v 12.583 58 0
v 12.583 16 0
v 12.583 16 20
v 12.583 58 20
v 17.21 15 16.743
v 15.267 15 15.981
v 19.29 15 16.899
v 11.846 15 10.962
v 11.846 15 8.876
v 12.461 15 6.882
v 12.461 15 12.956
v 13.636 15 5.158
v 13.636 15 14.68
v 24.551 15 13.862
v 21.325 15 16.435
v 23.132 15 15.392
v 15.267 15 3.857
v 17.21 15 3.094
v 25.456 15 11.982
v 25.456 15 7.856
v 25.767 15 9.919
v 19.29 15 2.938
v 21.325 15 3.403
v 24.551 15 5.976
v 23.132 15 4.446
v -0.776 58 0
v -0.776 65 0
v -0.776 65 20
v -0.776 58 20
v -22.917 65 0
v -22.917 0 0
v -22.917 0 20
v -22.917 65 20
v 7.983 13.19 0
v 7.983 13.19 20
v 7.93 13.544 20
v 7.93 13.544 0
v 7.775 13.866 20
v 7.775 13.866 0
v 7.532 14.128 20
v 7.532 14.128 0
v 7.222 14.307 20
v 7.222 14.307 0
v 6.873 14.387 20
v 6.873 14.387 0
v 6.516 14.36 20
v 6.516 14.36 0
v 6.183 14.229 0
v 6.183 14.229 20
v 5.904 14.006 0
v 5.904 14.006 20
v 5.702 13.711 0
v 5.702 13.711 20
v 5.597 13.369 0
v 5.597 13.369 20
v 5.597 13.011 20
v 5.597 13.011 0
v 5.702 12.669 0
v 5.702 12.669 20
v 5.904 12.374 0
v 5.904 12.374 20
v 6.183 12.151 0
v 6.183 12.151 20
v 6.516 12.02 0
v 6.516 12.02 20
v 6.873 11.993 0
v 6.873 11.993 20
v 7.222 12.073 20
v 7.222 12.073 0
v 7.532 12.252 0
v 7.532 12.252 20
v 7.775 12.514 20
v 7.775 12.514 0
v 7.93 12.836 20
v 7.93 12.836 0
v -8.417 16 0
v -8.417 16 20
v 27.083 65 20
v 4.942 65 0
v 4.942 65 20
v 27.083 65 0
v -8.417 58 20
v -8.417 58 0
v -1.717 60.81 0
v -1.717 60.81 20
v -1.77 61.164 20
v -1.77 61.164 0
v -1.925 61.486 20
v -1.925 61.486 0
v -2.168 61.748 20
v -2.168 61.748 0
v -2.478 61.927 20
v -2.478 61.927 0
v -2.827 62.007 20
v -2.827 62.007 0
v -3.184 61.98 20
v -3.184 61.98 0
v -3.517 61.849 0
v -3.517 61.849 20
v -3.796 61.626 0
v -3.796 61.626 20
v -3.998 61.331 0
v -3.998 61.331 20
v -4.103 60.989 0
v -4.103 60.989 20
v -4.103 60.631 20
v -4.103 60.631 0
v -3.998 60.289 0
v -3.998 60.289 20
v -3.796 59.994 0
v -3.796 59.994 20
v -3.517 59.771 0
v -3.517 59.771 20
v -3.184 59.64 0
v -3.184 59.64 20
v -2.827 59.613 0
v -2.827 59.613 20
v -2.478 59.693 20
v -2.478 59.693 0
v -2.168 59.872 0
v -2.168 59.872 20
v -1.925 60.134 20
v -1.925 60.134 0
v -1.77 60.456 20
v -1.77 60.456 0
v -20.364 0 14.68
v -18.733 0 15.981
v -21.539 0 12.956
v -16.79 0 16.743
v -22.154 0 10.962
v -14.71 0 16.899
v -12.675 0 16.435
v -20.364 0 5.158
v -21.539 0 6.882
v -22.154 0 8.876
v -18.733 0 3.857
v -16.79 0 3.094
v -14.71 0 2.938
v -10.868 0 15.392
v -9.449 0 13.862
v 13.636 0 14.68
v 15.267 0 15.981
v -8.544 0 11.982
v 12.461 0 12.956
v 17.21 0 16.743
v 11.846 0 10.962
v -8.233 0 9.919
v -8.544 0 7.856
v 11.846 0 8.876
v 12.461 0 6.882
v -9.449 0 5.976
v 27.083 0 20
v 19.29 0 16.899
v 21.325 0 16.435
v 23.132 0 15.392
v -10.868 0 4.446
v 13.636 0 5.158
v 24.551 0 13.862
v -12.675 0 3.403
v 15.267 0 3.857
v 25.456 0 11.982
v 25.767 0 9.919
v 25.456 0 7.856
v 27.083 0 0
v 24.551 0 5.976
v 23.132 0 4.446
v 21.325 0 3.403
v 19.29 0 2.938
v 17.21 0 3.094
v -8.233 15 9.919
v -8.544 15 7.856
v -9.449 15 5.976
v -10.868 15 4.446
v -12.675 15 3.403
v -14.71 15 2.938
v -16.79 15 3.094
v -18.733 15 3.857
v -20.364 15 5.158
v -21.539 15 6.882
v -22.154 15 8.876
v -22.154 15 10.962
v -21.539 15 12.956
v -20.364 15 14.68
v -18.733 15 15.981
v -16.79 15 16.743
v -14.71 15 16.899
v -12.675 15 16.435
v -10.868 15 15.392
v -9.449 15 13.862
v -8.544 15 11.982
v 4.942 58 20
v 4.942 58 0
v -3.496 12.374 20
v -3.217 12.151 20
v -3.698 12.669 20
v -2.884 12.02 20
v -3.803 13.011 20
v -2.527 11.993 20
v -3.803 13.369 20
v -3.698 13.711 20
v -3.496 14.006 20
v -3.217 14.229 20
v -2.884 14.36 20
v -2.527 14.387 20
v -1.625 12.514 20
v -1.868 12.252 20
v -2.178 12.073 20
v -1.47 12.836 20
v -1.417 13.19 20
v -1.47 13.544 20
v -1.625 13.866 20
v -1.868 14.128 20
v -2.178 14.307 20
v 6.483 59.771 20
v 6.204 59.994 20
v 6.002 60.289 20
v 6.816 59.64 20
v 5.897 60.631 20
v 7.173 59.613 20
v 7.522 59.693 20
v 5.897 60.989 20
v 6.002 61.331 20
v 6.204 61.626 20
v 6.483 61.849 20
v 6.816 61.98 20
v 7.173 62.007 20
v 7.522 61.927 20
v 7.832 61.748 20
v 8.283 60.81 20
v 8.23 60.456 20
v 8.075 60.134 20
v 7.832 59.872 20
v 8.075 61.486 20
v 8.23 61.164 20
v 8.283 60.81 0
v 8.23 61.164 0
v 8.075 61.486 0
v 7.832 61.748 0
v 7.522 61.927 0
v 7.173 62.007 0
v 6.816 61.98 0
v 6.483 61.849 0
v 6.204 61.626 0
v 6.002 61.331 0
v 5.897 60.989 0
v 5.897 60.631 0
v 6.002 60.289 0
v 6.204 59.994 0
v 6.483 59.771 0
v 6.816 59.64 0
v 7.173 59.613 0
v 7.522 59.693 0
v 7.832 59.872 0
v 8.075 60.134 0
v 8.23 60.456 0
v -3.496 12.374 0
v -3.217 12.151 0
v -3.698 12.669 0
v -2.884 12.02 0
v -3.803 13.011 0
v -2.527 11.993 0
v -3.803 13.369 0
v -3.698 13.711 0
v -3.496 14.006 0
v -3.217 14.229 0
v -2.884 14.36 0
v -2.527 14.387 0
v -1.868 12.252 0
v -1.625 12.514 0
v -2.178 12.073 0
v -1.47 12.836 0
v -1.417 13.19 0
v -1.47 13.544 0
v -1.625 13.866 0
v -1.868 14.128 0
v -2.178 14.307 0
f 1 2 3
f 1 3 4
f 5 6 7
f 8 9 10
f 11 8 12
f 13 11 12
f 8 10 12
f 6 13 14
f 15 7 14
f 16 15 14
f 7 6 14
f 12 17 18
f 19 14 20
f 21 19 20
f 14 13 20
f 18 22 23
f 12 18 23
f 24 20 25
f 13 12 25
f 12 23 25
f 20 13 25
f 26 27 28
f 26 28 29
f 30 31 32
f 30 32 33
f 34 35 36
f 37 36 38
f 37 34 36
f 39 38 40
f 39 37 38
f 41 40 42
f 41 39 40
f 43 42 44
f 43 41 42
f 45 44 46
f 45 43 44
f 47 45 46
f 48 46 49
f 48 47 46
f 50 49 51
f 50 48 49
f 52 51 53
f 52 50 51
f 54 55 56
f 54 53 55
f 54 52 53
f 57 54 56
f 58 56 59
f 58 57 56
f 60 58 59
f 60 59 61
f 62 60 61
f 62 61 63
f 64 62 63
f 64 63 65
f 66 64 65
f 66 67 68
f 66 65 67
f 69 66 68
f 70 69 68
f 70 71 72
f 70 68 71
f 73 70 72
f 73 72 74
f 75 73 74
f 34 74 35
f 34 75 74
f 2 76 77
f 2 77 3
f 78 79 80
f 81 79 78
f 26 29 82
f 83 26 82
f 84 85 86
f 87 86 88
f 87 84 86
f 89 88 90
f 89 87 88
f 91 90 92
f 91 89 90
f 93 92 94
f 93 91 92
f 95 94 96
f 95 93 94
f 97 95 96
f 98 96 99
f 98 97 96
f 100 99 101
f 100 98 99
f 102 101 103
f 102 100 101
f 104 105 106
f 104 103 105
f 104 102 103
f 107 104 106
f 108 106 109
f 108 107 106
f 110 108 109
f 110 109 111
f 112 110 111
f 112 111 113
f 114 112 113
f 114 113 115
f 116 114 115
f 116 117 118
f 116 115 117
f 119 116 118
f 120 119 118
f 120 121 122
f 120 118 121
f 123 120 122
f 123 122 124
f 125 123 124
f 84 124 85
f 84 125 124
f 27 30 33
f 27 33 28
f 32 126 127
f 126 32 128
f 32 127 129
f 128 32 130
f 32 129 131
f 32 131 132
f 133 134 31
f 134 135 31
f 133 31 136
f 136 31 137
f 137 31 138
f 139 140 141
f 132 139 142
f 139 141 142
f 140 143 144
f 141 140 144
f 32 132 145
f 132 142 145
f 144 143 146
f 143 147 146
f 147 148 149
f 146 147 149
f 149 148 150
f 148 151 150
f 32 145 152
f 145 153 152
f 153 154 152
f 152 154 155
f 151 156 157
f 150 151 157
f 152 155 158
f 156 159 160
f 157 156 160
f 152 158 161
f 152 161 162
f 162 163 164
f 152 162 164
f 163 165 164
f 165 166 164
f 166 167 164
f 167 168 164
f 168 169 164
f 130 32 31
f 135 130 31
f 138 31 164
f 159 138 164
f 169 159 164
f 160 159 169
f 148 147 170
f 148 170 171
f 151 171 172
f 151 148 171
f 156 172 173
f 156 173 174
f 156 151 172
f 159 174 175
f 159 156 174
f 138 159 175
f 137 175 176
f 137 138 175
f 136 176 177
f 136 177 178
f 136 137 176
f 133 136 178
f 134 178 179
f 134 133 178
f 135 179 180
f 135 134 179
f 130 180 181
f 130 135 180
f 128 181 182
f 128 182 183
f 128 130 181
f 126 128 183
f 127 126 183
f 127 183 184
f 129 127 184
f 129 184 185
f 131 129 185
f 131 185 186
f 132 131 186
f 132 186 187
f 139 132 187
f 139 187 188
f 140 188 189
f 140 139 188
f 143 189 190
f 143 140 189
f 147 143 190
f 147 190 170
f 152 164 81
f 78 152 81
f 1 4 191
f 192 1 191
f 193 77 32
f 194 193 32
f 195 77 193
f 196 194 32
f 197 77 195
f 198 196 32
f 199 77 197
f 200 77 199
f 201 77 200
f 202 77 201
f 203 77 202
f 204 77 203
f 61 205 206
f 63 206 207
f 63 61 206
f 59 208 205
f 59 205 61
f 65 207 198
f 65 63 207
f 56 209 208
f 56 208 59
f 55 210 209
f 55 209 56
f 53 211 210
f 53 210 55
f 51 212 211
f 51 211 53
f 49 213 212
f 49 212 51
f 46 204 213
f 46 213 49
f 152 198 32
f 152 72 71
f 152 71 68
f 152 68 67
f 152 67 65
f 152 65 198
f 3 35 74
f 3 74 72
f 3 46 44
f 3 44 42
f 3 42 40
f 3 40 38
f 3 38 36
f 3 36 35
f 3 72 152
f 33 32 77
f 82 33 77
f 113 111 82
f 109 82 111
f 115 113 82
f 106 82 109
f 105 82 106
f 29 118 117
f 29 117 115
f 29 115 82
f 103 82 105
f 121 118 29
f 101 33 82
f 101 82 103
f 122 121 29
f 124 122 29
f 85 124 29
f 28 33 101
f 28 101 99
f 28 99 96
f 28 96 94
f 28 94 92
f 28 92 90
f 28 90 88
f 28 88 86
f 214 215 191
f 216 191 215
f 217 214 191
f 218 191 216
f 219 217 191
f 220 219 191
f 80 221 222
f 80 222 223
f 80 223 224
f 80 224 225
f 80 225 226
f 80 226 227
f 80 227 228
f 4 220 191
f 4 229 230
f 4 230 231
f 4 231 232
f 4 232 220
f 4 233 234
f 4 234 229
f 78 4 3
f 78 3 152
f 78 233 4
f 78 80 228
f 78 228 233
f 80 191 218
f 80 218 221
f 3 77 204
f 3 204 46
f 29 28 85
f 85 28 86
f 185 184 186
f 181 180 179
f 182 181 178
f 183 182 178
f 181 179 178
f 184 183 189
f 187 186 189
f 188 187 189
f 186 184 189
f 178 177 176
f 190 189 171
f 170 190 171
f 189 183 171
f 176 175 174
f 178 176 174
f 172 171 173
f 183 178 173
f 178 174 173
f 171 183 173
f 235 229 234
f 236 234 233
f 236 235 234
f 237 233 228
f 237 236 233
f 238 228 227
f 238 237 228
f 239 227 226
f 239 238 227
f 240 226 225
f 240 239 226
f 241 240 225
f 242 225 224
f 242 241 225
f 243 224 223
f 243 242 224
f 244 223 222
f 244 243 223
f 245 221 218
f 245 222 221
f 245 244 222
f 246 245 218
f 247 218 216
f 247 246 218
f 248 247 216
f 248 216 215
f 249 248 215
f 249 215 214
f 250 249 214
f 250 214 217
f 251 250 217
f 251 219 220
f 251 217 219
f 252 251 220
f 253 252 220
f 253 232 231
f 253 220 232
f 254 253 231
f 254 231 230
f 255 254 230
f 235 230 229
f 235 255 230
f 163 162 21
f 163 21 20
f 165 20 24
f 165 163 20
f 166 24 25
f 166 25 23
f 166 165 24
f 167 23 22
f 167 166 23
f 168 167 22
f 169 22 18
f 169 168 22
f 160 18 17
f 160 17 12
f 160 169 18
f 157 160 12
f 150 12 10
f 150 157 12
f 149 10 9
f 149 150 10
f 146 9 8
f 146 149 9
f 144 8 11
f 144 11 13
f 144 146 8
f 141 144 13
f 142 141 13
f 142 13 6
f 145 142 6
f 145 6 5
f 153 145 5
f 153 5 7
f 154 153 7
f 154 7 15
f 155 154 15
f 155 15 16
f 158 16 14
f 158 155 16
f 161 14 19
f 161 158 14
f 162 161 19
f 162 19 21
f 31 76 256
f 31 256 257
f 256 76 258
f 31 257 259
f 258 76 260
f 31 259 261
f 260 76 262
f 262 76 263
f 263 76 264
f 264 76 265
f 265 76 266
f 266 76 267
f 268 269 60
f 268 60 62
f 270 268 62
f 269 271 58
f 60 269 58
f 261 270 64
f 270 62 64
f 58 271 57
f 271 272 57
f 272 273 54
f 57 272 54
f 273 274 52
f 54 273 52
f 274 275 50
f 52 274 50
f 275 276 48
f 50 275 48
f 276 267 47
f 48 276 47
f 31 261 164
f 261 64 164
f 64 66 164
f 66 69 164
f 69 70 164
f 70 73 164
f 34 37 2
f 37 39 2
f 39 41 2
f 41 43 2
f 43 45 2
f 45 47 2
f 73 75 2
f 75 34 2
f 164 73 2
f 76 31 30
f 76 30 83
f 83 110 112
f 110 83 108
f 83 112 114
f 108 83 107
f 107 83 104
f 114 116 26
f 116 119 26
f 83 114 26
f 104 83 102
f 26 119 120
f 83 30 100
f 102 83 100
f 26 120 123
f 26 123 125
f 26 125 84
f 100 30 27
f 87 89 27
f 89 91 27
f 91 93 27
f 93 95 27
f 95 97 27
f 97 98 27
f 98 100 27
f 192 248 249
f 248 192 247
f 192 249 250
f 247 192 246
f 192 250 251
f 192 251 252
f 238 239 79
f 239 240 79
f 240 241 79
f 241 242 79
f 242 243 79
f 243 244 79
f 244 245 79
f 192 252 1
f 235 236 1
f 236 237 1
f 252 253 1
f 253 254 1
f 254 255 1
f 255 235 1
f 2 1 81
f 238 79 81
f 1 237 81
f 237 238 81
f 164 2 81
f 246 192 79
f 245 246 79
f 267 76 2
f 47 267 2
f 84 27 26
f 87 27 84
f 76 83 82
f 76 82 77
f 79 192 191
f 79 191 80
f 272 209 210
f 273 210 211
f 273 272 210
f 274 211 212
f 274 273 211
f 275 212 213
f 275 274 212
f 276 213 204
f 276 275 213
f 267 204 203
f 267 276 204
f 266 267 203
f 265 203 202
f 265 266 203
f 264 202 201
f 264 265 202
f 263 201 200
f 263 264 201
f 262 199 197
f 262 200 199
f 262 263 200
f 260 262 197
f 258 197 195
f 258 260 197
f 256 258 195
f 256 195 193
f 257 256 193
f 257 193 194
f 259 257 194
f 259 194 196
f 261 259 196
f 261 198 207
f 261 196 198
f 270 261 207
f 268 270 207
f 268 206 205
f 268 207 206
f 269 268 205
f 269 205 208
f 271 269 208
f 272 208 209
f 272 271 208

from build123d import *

# Parameters (mm, degrees)
SKETCH_1_W          = 50
SKETCH_1_H          = 65
BOSS_EXTRUDE1_DEPTH = 20
SKETCH11_R          = 1.2
CUT_EXTRUDE1_DEPTH  = 28
SKETCH12_R          = 7
CUT_EXTRUDE2_DEPTH  = 15


with BuildPart() as part:
    # 草圖1 → Boss-Extrude1 (new body)
    with BuildSketch(Plane.XY):
        with Locations((2.083333333, 32.5)):
            Rectangle(SKETCH_1_W, SKETCH_1_H)
    extrude(amount=BOSS_EXTRUDE1_DEPTH)

    # Sketch11 → Cut-Extrude1 (cut)
    with BuildSketch(Plane.XY):
        with Locations((-2.916666667, 60.81)):
            Circle(SKETCH11_R)
        with Locations((-2.616666667, 13.19)):
            Circle(SKETCH11_R)
        with Locations((6.783333333, 13.19)):
            Circle(SKETCH11_R)
        with Locations((7.083333333, 60.81)):
            Circle(SKETCH11_R)
        Polygon((4.942250508, 65), (-0.775583841, 65), (-0.775583841, 58), (-8.416666667, 58), (-8.416666667, 16), (12.583333333, 16), (12.583333333, 58), (4.942250508, 58), align=None)
    extrude(amount=CUT_EXTRUDE1_DEPTH, mode=Mode.SUBTRACT)

    # Sketch12 → Cut-Extrude2 (cut)
    with BuildSketch(Plane(origin=(0, 0, 0), x_dir=(1, 0, 0), z_dir=(0, 1, 0))):
        with Locations((-15.232669486, -9.9188946)):
            Circle(SKETCH12_R)
        with Locations((18.767330514, -9.9188946)):
            Circle(SKETCH12_R)
    extrude(amount=CUT_EXTRUDE2_DEPTH, mode=Mode.SUBTRACT)


solid = part.part
